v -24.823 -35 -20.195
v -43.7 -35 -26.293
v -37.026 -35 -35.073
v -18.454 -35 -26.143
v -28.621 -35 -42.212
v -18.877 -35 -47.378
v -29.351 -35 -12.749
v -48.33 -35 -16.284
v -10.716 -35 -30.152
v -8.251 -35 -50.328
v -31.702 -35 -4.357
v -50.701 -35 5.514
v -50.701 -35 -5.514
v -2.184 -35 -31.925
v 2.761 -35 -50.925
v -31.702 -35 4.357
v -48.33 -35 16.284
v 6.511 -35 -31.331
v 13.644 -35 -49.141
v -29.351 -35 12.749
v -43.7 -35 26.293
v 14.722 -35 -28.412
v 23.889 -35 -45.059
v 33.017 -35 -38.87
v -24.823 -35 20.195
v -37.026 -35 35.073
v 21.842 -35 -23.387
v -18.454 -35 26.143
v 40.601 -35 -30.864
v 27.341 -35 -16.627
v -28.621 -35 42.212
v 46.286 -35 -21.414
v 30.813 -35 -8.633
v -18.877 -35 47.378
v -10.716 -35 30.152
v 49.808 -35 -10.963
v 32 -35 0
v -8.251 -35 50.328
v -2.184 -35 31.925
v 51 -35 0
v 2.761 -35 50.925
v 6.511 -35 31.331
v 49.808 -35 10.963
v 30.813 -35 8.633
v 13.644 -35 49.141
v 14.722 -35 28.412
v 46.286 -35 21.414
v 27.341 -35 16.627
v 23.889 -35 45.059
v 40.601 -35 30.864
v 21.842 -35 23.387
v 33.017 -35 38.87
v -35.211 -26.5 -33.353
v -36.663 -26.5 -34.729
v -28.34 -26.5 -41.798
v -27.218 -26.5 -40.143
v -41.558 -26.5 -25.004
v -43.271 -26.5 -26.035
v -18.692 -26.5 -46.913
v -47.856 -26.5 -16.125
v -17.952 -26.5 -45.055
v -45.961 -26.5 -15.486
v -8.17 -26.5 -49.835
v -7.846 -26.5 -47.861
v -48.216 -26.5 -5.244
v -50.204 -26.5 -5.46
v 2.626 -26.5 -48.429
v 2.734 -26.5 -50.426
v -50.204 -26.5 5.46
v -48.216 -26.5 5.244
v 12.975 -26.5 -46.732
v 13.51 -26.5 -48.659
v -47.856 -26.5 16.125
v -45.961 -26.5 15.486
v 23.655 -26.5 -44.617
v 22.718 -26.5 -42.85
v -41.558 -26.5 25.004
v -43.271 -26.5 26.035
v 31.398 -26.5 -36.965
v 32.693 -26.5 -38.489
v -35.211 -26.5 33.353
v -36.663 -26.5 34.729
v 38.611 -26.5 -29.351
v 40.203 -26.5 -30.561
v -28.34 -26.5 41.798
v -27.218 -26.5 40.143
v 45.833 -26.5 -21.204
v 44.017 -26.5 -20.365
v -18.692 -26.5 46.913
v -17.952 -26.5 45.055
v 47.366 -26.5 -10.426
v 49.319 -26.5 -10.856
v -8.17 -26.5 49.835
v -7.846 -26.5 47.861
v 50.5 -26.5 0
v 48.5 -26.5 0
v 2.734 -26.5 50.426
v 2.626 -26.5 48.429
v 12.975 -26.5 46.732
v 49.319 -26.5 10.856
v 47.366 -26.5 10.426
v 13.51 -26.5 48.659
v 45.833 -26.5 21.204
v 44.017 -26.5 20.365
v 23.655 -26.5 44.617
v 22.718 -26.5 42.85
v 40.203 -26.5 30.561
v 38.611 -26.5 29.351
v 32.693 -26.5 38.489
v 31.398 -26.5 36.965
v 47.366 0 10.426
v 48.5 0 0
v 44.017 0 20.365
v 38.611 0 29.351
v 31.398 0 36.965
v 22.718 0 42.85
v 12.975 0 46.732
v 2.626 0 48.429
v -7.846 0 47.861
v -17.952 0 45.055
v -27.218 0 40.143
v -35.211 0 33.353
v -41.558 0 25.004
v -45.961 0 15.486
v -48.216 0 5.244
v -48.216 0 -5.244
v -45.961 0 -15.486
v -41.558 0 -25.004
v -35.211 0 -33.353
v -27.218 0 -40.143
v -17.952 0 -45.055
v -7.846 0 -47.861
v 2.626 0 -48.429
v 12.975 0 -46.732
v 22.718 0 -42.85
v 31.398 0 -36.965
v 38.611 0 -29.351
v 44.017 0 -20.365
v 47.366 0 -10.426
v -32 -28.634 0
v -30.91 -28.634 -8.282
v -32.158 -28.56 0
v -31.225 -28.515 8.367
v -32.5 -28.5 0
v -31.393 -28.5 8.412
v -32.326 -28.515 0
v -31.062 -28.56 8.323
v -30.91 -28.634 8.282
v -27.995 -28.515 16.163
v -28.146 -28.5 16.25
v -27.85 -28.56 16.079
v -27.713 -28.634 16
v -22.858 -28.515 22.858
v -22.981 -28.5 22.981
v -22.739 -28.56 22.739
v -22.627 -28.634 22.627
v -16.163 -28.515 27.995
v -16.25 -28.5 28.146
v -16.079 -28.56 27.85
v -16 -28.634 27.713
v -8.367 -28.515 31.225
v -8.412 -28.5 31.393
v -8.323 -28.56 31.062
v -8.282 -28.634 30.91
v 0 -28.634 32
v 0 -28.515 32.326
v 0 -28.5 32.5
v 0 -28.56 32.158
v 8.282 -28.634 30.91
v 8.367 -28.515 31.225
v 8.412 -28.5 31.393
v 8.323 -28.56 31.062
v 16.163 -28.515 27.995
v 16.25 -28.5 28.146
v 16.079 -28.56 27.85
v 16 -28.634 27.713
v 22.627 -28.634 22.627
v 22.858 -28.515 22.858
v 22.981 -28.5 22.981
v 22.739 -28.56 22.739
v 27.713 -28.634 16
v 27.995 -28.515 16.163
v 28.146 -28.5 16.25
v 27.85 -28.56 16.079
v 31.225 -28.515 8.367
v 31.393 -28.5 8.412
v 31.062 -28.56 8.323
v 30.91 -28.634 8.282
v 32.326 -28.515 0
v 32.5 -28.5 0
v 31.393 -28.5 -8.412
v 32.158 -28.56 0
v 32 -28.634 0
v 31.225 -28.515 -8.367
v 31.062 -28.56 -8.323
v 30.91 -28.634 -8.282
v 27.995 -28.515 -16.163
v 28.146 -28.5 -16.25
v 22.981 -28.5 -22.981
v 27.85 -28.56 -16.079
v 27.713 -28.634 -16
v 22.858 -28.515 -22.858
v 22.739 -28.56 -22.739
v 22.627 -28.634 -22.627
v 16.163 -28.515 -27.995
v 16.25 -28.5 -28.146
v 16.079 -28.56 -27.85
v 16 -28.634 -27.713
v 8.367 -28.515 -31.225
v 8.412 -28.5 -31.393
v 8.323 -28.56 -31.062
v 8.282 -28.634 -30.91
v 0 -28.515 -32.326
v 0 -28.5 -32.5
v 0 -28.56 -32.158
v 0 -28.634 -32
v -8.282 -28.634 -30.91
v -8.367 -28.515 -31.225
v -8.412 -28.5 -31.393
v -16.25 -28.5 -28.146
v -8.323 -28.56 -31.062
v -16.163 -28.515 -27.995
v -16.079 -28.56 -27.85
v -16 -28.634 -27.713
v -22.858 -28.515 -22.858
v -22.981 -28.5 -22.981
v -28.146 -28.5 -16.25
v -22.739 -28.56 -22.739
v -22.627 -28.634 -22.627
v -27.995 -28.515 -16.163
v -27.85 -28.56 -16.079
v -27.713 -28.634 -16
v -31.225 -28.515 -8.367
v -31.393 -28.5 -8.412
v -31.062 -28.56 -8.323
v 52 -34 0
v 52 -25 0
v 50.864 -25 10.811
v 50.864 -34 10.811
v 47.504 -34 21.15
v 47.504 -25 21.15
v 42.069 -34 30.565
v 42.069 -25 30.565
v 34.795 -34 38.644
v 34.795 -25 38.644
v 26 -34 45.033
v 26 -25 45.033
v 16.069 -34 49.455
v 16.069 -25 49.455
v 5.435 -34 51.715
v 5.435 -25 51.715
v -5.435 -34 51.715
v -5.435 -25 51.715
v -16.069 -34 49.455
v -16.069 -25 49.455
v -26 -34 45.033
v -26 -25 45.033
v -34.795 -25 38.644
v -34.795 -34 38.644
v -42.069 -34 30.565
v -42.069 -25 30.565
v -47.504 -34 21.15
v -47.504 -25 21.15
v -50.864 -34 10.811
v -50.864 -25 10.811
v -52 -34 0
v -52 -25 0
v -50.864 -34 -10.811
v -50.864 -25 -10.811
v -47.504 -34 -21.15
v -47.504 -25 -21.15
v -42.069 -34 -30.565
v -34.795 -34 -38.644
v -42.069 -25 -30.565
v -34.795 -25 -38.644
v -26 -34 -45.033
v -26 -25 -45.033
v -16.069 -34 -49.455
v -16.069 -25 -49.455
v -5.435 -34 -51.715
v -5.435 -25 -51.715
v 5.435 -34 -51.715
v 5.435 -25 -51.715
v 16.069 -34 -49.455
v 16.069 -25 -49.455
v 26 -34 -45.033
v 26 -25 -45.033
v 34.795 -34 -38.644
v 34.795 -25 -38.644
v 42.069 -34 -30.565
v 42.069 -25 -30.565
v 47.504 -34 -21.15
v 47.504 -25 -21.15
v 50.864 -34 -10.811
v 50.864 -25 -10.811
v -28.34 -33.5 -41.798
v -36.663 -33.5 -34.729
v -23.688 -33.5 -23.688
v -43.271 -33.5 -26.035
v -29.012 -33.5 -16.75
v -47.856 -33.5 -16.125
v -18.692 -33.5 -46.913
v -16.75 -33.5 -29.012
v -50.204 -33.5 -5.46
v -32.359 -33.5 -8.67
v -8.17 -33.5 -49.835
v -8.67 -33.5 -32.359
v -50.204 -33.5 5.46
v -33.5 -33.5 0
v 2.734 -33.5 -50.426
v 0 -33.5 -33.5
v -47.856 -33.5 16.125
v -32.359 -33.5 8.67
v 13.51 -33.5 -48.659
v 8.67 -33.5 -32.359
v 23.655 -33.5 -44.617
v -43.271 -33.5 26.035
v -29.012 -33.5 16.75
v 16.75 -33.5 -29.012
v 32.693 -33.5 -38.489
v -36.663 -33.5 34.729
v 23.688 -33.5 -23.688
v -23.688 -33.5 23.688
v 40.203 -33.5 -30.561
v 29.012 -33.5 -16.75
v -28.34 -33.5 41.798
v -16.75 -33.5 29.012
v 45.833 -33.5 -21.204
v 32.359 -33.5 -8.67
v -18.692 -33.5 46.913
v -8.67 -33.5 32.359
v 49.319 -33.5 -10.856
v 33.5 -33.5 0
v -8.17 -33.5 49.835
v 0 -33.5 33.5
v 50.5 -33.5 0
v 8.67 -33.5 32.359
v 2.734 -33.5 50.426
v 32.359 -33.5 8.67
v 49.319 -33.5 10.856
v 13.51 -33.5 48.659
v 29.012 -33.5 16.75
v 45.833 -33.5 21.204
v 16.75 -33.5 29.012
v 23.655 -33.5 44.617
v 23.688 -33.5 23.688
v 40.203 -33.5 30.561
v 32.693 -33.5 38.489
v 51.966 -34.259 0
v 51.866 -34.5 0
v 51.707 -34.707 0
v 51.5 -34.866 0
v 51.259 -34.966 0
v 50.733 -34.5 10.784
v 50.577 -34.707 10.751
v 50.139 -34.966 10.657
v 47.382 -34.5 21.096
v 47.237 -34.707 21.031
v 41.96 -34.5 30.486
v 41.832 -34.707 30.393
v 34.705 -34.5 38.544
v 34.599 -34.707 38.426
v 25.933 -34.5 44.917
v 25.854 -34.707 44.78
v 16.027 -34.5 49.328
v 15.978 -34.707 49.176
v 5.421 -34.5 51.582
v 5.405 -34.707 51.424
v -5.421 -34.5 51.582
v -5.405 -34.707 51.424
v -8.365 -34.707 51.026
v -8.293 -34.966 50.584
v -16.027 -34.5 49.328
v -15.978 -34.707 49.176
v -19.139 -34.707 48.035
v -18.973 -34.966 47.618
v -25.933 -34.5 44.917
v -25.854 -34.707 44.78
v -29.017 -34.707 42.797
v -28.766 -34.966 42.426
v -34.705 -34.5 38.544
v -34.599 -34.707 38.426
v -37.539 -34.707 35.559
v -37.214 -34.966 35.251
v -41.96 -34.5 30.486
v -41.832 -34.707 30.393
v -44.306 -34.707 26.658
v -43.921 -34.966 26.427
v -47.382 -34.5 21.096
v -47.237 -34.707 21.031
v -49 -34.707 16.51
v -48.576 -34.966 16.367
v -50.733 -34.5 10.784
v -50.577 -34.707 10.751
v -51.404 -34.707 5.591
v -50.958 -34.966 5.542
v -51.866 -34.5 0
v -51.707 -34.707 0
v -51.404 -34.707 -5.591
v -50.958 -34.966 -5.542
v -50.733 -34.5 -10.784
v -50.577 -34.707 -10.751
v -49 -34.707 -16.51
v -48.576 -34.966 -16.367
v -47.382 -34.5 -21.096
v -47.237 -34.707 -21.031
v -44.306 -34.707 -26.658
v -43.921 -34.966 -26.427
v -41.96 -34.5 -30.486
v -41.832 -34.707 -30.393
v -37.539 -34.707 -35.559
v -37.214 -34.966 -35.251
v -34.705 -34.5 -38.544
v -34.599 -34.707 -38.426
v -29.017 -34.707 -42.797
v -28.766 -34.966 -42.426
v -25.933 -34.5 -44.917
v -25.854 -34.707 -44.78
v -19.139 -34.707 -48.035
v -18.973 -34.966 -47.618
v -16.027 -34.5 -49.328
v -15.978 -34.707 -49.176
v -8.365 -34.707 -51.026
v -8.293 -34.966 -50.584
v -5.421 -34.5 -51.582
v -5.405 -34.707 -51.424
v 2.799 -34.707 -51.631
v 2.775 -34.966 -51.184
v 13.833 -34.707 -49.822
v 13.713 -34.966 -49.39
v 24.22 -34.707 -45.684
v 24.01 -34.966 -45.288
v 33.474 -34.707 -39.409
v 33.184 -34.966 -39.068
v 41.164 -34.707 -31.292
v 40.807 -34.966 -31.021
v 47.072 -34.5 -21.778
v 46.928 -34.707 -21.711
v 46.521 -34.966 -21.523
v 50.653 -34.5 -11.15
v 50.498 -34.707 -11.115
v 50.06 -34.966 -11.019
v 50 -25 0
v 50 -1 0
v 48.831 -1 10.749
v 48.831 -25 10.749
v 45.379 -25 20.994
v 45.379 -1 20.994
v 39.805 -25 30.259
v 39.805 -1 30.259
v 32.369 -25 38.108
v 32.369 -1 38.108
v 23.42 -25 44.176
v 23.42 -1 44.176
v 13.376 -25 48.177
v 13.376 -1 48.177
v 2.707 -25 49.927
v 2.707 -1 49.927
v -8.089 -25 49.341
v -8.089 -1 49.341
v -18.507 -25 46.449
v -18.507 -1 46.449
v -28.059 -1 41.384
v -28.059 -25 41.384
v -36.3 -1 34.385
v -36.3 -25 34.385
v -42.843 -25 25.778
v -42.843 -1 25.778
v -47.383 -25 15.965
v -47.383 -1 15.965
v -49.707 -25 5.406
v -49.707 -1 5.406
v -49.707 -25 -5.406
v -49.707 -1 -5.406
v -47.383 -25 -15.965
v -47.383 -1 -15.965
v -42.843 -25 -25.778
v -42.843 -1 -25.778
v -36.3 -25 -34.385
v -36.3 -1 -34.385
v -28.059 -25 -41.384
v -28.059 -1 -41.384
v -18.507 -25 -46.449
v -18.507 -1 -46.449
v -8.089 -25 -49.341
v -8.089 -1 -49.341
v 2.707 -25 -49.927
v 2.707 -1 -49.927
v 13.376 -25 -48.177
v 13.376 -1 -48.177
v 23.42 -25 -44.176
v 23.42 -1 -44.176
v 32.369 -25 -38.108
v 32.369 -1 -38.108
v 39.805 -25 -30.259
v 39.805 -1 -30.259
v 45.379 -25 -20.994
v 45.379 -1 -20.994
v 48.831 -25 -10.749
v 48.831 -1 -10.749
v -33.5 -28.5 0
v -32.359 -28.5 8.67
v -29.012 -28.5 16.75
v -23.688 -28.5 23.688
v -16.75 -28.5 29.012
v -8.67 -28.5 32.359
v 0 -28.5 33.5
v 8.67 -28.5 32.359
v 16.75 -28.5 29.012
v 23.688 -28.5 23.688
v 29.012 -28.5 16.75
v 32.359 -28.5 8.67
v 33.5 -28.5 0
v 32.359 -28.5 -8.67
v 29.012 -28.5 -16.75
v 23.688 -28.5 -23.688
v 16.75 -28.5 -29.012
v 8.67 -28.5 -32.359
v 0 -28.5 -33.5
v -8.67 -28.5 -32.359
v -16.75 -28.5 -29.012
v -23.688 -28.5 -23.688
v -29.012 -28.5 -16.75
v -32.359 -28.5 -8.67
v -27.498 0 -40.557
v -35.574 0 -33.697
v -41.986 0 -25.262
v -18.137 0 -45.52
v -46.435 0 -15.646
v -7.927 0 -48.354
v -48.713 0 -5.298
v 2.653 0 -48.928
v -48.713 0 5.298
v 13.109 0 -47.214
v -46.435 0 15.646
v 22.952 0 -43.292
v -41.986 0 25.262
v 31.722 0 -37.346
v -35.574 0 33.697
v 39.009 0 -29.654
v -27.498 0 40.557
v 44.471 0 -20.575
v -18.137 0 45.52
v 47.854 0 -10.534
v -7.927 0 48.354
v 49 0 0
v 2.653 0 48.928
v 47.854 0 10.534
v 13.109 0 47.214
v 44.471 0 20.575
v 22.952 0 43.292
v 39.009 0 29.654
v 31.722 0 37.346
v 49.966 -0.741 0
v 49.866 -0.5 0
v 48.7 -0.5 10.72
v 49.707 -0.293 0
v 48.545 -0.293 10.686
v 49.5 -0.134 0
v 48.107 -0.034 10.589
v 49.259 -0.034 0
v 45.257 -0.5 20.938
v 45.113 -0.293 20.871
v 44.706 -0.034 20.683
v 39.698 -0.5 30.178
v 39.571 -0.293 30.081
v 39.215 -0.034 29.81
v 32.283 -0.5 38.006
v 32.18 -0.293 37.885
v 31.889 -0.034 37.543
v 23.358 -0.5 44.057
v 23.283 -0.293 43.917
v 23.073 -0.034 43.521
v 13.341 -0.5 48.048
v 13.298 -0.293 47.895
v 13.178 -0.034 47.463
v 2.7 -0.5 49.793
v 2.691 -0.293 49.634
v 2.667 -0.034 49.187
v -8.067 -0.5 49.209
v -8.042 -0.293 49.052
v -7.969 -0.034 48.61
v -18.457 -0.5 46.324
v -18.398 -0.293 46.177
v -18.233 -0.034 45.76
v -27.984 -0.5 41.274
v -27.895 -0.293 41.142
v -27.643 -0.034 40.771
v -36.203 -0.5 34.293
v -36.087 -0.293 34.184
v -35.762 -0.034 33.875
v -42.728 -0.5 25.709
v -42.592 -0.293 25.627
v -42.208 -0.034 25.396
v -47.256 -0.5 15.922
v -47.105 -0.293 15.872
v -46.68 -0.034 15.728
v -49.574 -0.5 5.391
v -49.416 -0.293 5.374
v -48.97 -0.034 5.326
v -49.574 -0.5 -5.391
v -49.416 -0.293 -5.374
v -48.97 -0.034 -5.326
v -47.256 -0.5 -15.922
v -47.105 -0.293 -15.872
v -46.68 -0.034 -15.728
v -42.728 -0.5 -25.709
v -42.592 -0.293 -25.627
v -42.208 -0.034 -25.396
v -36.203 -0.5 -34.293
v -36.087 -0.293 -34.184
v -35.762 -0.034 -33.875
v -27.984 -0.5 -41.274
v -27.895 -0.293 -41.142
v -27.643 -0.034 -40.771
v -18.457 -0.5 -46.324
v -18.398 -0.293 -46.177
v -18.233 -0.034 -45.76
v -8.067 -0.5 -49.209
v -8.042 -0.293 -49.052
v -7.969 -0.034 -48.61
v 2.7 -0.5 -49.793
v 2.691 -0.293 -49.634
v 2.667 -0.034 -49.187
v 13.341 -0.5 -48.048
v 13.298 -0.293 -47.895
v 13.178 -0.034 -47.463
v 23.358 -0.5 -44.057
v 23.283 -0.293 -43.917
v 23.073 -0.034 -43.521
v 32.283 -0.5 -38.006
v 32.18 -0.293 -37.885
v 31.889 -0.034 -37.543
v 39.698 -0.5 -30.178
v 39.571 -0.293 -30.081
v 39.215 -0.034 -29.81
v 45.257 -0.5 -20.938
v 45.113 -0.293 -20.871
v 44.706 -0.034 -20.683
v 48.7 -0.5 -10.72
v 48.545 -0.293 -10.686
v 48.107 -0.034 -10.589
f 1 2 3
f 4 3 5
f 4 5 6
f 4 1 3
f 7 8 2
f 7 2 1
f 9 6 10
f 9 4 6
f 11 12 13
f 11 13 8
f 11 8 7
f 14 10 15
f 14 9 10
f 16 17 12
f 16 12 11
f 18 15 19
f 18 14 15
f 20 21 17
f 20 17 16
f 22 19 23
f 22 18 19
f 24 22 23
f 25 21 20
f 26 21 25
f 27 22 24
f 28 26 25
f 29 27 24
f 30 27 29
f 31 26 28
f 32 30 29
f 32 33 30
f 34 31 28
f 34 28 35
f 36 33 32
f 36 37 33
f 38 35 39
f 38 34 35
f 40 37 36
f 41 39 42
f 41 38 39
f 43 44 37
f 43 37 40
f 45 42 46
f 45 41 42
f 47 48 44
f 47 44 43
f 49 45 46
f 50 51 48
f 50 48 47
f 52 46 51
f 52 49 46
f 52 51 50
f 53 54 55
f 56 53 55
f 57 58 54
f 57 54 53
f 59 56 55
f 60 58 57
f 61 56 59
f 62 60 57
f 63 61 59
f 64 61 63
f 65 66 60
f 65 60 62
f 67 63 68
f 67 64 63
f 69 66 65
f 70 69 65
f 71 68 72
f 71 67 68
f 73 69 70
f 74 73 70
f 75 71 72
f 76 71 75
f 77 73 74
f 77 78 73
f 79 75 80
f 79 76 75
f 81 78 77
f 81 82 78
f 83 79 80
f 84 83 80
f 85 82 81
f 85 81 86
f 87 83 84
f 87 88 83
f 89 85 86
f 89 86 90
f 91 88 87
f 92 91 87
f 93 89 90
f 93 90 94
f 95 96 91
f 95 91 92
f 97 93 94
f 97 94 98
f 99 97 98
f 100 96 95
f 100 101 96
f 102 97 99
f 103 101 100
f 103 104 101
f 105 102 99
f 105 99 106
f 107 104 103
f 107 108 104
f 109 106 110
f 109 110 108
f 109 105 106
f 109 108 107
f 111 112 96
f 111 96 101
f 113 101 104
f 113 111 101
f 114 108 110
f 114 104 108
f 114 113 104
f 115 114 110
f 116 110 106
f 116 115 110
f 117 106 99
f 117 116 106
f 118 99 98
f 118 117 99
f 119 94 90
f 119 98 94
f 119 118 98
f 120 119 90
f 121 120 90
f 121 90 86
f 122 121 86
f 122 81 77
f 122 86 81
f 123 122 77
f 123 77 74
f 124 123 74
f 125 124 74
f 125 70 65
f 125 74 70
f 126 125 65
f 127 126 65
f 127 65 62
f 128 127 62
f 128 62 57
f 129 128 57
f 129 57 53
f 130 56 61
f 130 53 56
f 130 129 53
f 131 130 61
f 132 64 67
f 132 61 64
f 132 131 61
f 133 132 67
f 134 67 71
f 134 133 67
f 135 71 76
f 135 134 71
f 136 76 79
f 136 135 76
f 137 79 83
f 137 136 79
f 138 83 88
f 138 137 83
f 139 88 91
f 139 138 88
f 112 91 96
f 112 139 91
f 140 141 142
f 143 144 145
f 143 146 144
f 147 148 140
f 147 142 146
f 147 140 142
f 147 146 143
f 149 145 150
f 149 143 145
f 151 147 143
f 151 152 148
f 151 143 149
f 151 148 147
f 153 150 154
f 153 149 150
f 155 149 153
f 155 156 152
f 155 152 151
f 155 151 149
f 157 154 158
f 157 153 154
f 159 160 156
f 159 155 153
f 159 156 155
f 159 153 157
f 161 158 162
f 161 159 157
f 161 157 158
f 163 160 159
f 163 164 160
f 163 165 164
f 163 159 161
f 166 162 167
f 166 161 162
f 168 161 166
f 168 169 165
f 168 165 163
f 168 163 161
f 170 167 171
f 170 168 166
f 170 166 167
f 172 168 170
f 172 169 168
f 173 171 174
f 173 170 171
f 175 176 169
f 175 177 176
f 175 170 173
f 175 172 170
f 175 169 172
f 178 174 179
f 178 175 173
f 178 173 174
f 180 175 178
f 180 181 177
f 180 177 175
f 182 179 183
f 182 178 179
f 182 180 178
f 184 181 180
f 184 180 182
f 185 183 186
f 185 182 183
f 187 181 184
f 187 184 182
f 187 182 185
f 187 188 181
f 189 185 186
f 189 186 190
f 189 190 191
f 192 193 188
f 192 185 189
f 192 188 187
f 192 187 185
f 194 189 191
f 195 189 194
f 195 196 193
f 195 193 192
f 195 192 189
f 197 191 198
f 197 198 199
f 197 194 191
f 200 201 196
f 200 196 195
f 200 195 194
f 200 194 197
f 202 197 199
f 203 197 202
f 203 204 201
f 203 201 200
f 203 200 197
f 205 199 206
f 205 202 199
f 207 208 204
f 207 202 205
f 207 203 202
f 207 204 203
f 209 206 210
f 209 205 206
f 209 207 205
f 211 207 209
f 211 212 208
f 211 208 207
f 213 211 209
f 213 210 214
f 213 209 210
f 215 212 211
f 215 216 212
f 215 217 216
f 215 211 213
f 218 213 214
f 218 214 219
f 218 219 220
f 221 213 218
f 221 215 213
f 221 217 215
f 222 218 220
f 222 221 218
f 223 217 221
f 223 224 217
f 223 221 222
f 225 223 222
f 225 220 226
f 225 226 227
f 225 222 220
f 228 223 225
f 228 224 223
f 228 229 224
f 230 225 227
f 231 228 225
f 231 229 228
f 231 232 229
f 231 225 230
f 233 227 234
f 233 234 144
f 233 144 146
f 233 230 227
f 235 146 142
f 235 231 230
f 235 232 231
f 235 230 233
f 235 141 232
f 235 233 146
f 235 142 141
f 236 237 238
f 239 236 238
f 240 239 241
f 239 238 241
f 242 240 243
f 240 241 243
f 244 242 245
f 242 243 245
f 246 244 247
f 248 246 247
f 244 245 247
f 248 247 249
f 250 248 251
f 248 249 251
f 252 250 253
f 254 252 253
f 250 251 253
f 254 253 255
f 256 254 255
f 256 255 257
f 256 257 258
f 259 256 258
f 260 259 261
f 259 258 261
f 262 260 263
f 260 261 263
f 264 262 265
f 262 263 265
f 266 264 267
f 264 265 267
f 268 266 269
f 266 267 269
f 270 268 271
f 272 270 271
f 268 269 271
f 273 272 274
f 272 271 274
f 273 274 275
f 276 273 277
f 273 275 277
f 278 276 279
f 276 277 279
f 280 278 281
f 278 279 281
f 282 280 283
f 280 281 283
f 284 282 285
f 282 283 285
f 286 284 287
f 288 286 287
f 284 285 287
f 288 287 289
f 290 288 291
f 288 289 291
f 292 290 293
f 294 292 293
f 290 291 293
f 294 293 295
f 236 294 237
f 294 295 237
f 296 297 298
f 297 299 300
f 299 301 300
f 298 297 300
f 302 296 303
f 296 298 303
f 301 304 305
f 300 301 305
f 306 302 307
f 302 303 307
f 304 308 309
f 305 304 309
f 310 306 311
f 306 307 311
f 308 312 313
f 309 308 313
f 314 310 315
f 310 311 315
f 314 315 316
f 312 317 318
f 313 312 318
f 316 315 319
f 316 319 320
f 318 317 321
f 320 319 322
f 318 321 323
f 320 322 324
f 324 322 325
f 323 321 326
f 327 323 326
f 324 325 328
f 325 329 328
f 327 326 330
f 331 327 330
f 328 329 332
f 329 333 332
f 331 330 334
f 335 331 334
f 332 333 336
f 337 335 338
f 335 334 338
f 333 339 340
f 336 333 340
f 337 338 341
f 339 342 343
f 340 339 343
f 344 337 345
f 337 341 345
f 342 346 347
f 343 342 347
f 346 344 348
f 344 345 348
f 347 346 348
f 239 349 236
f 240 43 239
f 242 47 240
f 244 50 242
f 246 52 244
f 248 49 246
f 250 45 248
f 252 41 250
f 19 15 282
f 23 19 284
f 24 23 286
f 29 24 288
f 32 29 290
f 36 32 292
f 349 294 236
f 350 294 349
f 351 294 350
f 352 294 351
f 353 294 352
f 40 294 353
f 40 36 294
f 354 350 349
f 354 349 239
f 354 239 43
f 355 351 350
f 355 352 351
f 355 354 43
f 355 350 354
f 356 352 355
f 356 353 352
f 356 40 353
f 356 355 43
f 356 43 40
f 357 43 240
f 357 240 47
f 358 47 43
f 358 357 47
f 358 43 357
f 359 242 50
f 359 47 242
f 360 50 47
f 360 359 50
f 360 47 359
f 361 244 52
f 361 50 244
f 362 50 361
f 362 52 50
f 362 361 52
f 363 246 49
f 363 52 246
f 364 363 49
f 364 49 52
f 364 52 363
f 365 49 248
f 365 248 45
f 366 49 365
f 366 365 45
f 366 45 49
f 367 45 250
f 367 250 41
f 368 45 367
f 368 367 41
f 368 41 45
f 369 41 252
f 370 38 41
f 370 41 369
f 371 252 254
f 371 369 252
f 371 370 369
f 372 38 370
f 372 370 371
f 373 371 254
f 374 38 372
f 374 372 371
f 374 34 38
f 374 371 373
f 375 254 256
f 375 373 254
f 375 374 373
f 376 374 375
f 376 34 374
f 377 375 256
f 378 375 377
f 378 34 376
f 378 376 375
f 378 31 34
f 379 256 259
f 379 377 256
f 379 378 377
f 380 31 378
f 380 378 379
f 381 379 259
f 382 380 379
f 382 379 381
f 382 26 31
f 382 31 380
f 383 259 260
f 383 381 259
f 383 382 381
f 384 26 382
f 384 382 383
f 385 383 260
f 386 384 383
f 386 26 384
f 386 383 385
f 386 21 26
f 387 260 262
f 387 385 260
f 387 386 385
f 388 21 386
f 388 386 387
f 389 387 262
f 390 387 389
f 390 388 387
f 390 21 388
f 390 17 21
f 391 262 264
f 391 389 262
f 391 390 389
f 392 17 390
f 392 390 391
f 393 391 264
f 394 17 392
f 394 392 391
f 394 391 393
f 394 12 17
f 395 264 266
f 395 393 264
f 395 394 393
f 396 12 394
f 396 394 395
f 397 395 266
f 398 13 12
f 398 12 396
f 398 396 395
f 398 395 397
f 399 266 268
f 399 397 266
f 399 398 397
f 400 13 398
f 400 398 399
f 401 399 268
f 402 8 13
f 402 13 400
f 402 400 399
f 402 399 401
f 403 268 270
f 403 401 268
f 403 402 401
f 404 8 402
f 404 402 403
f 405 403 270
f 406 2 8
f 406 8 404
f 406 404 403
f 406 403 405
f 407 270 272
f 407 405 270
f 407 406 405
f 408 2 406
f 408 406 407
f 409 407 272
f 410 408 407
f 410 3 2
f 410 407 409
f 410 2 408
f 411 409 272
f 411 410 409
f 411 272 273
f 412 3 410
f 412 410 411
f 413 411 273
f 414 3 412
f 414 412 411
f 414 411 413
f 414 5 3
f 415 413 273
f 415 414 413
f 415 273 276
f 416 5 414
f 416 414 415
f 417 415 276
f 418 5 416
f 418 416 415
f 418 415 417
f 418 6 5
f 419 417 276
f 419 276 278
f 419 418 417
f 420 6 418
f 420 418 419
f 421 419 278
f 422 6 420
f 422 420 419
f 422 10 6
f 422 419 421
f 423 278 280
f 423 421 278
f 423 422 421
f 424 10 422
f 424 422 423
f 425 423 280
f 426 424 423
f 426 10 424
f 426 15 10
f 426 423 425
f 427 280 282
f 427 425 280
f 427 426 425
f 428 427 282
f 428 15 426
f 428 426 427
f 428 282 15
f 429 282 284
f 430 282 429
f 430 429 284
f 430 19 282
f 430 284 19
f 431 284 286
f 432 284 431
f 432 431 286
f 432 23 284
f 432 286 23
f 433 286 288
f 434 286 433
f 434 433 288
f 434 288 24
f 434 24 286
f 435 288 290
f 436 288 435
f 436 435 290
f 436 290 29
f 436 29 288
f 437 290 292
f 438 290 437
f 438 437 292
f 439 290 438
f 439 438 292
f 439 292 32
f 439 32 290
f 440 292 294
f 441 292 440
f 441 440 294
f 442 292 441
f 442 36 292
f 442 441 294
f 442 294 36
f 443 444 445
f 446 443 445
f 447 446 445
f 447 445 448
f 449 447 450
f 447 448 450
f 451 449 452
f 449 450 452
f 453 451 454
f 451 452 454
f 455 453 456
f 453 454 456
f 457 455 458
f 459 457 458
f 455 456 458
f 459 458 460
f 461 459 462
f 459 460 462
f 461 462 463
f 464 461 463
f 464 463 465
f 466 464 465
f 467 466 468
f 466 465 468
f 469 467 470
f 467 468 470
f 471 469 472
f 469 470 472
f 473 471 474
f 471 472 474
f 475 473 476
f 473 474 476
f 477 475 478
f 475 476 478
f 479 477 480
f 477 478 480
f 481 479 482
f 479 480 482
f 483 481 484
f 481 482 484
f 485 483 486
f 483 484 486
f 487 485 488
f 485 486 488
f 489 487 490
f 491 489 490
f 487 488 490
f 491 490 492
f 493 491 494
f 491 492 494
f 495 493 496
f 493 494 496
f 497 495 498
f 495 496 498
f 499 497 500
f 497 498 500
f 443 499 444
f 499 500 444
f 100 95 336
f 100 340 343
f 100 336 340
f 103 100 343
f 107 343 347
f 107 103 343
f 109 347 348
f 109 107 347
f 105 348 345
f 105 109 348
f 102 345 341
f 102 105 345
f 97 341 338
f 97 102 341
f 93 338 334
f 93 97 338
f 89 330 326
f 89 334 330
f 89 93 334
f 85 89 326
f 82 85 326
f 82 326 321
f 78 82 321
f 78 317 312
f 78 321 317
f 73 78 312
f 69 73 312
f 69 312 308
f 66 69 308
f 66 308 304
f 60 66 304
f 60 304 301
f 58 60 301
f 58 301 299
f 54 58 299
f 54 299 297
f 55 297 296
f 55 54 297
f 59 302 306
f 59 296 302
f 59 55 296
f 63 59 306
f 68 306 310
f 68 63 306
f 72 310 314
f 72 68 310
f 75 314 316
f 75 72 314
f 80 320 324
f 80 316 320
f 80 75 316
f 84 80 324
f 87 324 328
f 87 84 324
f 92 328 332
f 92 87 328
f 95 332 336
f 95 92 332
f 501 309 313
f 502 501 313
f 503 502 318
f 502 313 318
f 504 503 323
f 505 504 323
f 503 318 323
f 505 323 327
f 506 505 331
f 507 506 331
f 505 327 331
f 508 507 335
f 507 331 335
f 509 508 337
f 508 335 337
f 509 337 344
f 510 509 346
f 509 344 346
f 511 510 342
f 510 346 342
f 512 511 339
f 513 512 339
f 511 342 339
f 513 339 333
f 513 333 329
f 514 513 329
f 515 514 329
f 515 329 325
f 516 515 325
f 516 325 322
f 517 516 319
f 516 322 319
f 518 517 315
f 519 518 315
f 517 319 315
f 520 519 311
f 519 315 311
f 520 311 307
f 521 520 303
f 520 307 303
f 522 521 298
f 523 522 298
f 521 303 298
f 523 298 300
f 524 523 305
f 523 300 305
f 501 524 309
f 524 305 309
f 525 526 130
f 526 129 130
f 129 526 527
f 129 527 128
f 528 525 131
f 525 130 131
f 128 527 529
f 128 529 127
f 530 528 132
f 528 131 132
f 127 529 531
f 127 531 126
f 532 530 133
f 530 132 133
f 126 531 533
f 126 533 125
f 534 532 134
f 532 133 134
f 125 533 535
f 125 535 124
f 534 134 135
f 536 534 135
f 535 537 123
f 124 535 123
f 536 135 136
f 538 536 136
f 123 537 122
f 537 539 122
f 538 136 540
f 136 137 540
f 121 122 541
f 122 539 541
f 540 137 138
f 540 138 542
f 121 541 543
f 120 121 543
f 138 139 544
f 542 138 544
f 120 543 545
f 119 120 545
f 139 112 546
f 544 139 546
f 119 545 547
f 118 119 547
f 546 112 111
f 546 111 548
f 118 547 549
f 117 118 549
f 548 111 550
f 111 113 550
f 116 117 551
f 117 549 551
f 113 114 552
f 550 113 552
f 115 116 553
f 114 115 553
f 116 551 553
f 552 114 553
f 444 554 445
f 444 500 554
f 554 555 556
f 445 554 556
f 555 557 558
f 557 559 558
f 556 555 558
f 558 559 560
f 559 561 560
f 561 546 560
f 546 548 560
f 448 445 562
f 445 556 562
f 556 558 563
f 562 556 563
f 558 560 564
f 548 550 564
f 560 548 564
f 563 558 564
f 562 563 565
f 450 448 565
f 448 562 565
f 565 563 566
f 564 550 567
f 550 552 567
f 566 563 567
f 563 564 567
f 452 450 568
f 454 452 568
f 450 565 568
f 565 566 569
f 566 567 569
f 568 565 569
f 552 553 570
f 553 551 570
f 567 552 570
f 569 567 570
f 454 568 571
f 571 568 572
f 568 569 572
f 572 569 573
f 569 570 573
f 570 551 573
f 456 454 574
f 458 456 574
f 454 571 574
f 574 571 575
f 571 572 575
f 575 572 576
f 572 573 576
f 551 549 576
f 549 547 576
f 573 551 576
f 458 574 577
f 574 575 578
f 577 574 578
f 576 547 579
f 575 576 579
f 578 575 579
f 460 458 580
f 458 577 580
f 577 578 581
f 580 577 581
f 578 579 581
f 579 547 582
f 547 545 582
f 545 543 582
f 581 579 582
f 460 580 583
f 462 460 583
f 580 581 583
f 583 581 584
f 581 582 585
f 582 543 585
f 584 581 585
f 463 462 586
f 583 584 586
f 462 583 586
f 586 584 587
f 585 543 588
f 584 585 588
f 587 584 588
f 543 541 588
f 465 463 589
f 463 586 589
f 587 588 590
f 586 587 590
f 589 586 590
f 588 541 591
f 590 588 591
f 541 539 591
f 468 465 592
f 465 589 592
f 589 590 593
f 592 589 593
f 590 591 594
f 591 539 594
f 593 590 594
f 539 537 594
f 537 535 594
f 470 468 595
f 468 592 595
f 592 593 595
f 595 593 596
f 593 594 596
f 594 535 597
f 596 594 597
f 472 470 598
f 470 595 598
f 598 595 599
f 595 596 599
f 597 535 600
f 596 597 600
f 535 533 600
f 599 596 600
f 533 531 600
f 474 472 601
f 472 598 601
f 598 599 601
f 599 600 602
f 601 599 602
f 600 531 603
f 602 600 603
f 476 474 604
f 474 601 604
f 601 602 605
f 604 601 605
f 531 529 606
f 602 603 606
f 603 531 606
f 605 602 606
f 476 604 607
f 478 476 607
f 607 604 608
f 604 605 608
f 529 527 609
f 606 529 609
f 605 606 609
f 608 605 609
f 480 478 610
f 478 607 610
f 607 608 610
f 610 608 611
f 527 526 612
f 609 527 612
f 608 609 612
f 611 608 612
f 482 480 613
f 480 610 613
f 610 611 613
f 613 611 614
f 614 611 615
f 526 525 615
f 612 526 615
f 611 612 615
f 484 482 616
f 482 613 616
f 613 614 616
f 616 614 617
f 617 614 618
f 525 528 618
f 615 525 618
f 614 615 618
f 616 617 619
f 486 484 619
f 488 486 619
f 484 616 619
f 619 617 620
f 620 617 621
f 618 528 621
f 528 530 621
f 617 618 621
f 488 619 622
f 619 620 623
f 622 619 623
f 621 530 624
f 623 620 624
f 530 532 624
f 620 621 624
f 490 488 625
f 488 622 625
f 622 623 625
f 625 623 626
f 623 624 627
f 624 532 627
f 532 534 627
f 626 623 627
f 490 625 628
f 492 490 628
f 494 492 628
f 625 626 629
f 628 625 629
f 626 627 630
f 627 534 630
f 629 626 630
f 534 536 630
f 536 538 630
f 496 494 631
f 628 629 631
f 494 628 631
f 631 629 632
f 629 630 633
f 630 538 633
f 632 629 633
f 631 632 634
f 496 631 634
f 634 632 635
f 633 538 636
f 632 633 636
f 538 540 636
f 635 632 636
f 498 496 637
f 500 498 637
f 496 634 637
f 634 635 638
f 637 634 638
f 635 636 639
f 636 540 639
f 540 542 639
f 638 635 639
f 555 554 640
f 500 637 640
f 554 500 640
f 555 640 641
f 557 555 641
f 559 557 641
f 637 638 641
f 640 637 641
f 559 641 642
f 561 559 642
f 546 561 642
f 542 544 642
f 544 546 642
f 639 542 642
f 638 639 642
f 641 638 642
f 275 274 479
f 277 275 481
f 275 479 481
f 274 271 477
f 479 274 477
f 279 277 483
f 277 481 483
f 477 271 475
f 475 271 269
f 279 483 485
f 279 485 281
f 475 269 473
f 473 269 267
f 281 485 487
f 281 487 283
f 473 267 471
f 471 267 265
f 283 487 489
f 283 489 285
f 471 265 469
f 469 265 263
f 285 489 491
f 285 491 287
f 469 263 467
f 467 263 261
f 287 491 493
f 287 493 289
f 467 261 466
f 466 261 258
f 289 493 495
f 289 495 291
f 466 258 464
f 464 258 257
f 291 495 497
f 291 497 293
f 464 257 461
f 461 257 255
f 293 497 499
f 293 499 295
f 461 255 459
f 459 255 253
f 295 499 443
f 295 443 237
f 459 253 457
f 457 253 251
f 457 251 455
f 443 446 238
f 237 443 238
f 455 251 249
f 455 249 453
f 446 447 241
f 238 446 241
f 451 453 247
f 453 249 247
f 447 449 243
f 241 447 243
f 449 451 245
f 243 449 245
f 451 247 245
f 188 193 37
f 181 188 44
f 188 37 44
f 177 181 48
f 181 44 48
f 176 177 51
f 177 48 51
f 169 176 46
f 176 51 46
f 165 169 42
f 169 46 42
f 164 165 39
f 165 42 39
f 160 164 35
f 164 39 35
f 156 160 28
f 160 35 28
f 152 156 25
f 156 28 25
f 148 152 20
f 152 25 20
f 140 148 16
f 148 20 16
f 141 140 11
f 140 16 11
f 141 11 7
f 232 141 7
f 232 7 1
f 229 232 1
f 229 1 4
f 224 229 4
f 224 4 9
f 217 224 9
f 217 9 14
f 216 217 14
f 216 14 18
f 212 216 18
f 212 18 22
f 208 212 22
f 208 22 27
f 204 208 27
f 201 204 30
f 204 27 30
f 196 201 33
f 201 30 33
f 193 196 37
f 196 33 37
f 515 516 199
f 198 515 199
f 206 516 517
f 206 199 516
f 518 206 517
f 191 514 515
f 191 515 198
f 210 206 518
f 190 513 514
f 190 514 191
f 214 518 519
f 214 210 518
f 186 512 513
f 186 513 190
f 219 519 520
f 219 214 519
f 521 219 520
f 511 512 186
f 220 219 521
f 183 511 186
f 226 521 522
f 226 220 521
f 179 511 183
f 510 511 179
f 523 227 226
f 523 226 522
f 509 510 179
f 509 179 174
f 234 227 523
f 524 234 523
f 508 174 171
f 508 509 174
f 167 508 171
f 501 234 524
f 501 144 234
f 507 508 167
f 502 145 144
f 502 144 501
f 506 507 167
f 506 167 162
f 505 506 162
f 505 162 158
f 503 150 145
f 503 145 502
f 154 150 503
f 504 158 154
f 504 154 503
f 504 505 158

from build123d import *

# Parameters (mm, degrees)
F0_R      = 50
F1_DEPTH  = 25
F2_R      = 52
F2_R_2    = 50
F3_DEPTH  = 10
F5_T      = -1.5
F6_R      = 33.5
F6_R_2    = 31.5
F7_DEPTH  = 5
F8_R      = 1
F9_R      = 32
F10_DEPTH = 25


# Not quite as in the source:
# - a feature of the source that left no trace in its solid (it failed there, or was rolled back) is left out


with BuildPart() as f1:
    # F0 (on Front) → F1 (new body)
    with BuildSketch(Plane.XZ):
        Circle(F0_R)
    extrude(amount=F1_DEPTH)

    # F2 (on face) → F3 (join)
    with BuildSketch(Plane.XZ.offset(25)):
        Circle(F2_R)
        Circle(F2_R_2, mode=Mode.SUBTRACT)
        Circle(F2_R_2)
    extrude(amount=F3_DEPTH)

    # F5
    f5_openings = [f1.faces().sort_by_distance(p)[0] for p in [
        (0, 0, 0),
    ]]
    offset(amount=F5_T, openings=f5_openings, kind=Kind.INTERSECTION)

    # F6 (on face) → F7 (join)
    with BuildSketch(Plane(origin=(0, -33.5, 0), x_dir=(-1, 0, 0), z_dir=(0, 1, 0))):
        Circle(F6_R)
        Circle(F6_R_2, mode=Mode.SUBTRACT)
    extrude(amount=F7_DEPTH)

    # F8
    f8_edges = [f1.edges().sort_by_distance(p)[0] for p in [
        (31.5, -28.5, 0),
        (-52, -35, 0),
        (-50, 0, 0),
    ]]
    fillet(f8_edges, radius=F8_R)

    # F9 (on face) → F10 (cut)
    with BuildSketch(Plane.XZ.offset(35)):
        Circle(F9_R)
    extrude(amount=-F10_DEPTH, mode=Mode.SUBTRACT)


solid = f1.part
